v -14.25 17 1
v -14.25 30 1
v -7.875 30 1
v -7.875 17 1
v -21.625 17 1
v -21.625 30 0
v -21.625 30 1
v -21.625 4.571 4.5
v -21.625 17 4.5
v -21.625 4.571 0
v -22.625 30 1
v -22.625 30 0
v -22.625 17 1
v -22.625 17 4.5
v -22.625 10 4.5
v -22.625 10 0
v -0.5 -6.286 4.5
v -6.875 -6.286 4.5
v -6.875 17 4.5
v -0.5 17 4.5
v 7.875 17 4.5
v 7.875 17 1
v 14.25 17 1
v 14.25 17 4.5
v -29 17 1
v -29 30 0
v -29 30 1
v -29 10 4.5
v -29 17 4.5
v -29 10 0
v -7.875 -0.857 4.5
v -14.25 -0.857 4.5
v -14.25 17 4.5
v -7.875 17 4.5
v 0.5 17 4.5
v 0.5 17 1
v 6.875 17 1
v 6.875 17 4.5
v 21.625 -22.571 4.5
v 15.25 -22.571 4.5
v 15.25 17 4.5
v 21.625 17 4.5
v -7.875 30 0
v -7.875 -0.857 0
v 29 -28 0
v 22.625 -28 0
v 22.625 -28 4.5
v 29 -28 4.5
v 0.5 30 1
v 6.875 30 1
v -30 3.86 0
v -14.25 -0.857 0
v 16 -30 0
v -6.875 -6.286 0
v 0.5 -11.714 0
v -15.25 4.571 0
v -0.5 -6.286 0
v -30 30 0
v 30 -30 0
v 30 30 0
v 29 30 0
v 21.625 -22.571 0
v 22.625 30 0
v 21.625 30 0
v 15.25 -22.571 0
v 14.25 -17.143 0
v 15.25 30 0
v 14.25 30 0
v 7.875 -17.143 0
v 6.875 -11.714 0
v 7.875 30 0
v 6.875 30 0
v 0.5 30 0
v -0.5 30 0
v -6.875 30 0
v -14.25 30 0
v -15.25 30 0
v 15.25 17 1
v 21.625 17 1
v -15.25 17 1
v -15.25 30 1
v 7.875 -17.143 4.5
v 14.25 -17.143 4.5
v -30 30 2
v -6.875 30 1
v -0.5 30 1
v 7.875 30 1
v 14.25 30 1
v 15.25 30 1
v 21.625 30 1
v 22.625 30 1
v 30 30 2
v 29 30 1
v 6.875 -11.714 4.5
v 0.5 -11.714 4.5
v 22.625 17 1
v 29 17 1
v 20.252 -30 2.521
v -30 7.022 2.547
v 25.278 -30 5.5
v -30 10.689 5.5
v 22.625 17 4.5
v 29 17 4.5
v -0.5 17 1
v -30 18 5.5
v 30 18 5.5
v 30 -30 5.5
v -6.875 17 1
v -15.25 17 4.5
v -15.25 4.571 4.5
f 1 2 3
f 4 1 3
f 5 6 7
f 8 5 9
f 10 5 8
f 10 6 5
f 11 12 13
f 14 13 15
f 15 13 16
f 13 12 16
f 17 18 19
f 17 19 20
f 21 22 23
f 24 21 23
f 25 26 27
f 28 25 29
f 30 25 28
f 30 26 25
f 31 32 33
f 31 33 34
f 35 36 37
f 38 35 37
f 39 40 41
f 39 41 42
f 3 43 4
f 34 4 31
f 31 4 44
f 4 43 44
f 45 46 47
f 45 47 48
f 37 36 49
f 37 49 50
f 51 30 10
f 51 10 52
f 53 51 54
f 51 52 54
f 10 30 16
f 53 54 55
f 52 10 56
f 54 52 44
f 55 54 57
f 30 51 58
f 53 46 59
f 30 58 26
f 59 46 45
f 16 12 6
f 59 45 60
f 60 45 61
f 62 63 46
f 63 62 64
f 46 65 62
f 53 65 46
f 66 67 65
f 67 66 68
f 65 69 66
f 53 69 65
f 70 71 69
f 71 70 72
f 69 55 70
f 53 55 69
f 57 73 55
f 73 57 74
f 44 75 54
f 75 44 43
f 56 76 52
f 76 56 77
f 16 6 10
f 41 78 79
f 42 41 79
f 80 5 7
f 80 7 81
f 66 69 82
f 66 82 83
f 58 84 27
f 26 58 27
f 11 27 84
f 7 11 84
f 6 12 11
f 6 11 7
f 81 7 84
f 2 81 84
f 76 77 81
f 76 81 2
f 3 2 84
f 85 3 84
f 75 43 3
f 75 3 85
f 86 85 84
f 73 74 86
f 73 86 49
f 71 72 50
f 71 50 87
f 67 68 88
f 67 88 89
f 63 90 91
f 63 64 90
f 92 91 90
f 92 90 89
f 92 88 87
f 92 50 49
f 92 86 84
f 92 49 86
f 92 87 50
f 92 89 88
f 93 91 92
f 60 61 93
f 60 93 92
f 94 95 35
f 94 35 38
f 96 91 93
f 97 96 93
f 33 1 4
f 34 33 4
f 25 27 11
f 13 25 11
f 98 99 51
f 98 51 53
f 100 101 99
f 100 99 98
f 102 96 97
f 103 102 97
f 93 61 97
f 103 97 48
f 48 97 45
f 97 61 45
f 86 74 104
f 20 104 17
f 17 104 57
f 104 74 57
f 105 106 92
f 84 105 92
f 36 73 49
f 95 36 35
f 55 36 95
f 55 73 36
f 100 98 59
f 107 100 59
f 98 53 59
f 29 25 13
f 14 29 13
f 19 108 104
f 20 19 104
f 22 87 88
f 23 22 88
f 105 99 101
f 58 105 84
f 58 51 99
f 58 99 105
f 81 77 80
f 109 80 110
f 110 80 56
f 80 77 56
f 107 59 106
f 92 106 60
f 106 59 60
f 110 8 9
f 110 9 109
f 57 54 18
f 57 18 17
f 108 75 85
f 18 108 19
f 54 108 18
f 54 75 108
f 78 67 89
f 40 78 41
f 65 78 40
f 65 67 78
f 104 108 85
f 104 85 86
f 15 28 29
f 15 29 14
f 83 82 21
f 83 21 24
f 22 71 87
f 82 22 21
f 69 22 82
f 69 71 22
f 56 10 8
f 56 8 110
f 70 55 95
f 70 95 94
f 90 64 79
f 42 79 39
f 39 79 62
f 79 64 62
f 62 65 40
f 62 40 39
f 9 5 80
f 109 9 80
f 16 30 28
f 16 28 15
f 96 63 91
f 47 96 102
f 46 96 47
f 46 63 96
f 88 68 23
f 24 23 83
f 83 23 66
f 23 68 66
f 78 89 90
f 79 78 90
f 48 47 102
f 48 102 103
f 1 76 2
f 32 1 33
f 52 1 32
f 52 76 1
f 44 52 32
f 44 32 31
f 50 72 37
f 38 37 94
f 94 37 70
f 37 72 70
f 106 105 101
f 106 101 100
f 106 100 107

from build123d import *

# Parameters (mm, degrees)
F0_W     = 60
F0_H     = 60
F1_DEPTH = 5.5
F3_DEPTH = 60
F4_W     = 6.375
F4_H     = 13
F5_DEPTH = 1
F6_W     = 6.375
F6_H     = 45
F6_H_2   = 7
F6_H_3   = 12.4285714286
F6_H_4   = 17.8571428571
F6_H_5   = 23.2857142857
F6_H_6   = 28.7142857143
F6_H_7   = 34.1428571429
F6_H_8   = 39.5714285714
F7_DEPTH = 4.5
F9_DEPTH = 5.5
F9_TAPER = -45


with BuildPart() as f1:
    # F0 (on Top) → F1 (new body)
    with BuildSketch(Plane.XY):
        Rectangle(F0_W, F0_H)
    extrude(amount=F1_DEPTH)

    # F2 (on face) → F3 (cut, through all)
    with BuildSketch(Plane.YZ.offset(30)):
        Polygon((18, 5.5), (30, 2), (30, 5.5), align=None)
    extrude(amount=-F3_DEPTH, mode=Mode.SUBTRACT)

    # F4 (on face) → F5 (cut)
    with BuildSketch(Plane(origin=(0, 0, 0), x_dir=(1, 0, 0), z_dir=(0, 0, -1))):
        with Locations((-25.8125, -23.5)):
            Rectangle(F4_W, F4_H)
        with Locations((-11.0625, -23.5)):
            Rectangle(F4_W, F4_H)
        with Locations((18.4375, -23.5)):
            Rectangle(F4_W, F4_H)
        with Locations((11.0625, -23.5)):
            Rectangle(F4_W, F4_H)
        with Locations((3.6875, -23.5)):
            Rectangle(F4_W, F4_H)
        with Locations((-18.4375, -23.5)):
            Rectangle(F4_W, F4_H)
        with Locations((-3.6875, -23.5)):
            Rectangle(F4_W, F4_H)
        with Locations((25.8125, -23.5)):
            Rectangle(F4_W, F4_H)
    extrude(amount=-F5_DEPTH, mode=Mode.SUBTRACT)

    # F6 (on face) → F7 (cut)
    with BuildSketch(Plane(origin=(0, 0, 0), x_dir=(1, 0, 0), z_dir=(0, 0, -1))):
        with Locations((25.8125, 5.5)):
            Rectangle(F6_W, F6_H)
        with Locations((-25.8125, -13.5)):
            Rectangle(F6_W, F6_H_2)
        with Locations((-18.4375, -10.7857142857)):
            Rectangle(F6_W, F6_H_3)
        with Locations((-11.0625, -8.0714285714)):
            Rectangle(F6_W, F6_H_4)
        with Locations((-3.6875, -5.3571428571)):
            Rectangle(F6_W, F6_H_5)
        with Locations((3.6875, -2.6428571429)):
            Rectangle(F6_W, F6_H_6)
        with Locations((11.0625, 0.0714285714)):
            Rectangle(F6_W, F6_H_7)
        with Locations((18.4375, 2.7857142857)):
            Rectangle(F6_W, F6_H_8)
    extrude(amount=-F7_DEPTH, mode=Mode.SUBTRACT)

    # F8 (on face) → F9 (cut, through all)
    with BuildSketch(Plane(origin=(0, 0, 0), x_dir=(1, 0, 0), z_dir=(0, 0, -1))):
        Polygon((-30, 30), (-30, -3.8595641646), (16, 30), align=None)
    extrude(amount=-F9_DEPTH, taper=F9_TAPER, mode=Mode.SUBTRACT)


solid = f1.part
